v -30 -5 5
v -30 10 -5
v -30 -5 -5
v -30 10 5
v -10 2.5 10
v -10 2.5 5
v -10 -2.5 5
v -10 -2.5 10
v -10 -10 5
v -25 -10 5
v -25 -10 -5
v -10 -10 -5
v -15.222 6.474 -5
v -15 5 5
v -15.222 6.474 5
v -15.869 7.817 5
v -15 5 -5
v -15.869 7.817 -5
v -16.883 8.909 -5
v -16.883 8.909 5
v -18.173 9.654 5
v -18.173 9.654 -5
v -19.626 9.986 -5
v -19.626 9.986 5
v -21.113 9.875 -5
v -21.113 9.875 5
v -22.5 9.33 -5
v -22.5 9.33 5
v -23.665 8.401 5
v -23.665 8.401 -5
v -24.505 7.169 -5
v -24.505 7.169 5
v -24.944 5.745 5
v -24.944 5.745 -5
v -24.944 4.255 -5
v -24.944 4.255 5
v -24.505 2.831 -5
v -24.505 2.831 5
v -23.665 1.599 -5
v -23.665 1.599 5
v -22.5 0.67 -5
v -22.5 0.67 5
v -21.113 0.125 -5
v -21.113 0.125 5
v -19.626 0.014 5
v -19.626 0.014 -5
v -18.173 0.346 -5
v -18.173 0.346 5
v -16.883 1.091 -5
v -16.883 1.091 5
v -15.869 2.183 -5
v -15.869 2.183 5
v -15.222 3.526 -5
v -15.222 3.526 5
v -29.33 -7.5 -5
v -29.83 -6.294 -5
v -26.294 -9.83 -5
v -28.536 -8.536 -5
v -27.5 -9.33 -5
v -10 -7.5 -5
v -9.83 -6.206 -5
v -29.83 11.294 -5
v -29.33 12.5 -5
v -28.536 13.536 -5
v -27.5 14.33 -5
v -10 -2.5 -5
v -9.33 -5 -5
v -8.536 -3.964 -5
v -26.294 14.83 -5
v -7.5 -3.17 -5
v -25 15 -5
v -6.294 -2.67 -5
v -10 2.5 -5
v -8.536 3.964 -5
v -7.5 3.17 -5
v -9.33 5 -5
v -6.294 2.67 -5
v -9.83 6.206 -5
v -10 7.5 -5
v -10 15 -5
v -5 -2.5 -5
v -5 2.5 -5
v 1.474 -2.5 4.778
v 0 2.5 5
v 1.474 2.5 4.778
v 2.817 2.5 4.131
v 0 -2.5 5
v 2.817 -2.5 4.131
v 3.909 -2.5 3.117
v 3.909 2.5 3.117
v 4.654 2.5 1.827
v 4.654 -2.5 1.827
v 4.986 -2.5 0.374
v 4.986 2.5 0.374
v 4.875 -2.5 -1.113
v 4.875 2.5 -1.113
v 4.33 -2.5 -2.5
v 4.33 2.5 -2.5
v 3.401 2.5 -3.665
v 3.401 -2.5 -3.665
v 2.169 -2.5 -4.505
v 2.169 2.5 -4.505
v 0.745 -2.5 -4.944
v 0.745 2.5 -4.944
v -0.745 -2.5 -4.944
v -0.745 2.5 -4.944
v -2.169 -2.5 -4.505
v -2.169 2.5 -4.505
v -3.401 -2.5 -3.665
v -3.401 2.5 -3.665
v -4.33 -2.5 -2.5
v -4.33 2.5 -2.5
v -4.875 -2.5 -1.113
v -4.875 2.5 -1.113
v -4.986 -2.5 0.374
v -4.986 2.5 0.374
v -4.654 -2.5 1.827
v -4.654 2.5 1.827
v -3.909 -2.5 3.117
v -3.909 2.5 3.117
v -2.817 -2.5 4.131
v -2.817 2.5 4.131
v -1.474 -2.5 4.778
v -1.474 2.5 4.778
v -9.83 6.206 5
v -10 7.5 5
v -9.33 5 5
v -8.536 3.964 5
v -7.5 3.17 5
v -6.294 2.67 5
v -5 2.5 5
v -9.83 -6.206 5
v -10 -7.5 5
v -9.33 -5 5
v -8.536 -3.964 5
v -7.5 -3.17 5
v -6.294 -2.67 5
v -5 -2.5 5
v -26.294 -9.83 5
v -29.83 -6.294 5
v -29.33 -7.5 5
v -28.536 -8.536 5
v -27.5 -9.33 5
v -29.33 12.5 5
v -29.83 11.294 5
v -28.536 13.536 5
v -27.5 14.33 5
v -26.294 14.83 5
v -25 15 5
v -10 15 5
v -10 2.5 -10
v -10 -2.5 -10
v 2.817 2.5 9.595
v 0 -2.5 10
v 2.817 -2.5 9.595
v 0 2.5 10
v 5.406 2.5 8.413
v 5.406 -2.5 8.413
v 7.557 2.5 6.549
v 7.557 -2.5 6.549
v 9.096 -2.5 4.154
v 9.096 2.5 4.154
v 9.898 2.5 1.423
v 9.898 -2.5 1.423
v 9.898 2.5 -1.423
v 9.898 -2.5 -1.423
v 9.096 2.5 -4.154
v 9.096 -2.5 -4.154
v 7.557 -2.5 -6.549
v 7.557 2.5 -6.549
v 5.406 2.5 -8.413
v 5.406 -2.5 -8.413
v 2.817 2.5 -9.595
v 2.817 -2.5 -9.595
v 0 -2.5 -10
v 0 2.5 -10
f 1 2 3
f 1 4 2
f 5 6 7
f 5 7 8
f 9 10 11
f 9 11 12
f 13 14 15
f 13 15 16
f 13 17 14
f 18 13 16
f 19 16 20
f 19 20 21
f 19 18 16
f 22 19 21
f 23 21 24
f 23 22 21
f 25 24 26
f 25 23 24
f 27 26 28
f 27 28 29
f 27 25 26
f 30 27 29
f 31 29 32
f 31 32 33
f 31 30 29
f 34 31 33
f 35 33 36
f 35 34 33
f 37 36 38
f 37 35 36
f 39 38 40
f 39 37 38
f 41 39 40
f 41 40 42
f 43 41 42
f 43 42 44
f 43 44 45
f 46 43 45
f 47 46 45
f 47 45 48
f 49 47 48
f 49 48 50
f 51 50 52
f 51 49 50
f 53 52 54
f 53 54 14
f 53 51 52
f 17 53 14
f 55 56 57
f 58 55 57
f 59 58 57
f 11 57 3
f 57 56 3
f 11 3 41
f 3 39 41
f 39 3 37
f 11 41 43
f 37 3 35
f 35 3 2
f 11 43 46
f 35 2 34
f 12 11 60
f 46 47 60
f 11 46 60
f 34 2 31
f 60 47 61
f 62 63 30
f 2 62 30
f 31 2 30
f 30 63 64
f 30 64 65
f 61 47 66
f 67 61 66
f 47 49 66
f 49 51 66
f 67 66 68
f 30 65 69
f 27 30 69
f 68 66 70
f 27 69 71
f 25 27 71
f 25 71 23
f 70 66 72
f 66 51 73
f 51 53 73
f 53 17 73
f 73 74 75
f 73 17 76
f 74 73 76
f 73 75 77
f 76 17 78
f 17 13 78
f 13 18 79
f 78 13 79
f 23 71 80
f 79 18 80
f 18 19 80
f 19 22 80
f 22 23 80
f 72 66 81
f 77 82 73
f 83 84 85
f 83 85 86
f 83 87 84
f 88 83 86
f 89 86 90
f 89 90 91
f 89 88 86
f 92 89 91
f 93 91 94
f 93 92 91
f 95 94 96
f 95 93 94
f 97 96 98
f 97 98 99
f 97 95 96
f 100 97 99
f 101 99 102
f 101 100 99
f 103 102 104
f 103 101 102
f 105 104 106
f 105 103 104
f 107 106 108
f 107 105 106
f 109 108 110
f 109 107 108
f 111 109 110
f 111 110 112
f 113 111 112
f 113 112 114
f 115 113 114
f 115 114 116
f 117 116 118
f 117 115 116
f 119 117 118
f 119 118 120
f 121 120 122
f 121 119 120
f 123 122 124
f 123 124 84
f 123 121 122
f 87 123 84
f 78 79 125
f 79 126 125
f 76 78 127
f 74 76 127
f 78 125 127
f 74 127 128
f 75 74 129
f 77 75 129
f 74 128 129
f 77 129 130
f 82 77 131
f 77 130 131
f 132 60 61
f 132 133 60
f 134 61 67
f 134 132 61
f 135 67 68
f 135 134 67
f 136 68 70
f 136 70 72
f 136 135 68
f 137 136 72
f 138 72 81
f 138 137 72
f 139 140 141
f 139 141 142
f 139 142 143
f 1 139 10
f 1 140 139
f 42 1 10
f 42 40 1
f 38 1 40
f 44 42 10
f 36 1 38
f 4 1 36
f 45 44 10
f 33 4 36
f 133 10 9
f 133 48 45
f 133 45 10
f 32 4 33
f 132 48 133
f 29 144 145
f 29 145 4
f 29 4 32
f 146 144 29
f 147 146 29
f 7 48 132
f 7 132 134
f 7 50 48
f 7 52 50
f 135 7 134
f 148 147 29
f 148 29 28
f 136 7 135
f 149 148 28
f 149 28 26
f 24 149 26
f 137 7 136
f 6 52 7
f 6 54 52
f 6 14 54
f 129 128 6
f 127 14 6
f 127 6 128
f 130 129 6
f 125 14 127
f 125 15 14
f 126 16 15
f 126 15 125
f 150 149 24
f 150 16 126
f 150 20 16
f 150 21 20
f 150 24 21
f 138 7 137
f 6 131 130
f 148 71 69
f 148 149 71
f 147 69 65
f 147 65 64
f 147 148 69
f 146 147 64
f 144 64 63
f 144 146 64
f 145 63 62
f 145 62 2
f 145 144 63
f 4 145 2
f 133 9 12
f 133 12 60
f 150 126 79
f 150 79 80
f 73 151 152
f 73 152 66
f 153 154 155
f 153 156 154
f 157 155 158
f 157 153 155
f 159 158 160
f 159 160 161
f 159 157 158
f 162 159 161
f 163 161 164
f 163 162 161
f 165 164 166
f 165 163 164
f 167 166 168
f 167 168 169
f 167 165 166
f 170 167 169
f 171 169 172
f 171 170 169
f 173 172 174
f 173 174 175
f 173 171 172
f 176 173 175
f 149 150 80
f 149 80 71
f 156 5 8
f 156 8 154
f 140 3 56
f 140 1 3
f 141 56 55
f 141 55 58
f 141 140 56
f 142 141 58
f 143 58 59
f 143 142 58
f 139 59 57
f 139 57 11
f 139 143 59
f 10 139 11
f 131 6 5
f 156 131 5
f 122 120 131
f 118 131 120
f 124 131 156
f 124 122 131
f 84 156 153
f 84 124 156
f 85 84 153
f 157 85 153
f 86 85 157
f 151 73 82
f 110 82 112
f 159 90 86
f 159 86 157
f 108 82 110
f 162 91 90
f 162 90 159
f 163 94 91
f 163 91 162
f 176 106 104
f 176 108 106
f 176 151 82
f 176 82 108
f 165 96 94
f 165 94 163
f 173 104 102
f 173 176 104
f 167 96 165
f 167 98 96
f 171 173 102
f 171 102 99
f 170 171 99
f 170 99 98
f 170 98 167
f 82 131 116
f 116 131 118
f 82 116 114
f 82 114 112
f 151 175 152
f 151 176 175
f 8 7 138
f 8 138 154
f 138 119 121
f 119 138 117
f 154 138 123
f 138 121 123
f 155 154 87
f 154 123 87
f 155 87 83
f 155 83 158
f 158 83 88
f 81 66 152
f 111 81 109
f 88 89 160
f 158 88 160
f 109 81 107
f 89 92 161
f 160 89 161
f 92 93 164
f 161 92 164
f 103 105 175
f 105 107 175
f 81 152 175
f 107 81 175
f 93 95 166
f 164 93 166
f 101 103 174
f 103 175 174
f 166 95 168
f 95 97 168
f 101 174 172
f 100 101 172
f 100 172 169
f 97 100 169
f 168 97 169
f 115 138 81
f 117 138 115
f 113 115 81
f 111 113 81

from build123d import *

# Parameters (mm, degrees)
SKETCH_1_R      = 5
EXTRUDE_1_DEPTH = 2.5
SKETCH_2_R      = 5
EXTRUDE_2_DEPTH = 5
FILLET_1_R      = 5


with BuildPart() as part:
    # 草圖1 → 填料-伸長1 (new, symmetric)
    with BuildSketch(Plane(origin=(0, 0, 0), x_dir=(1, 0, 0), z_dir=(0, 1, 0))):
        with BuildLine():
            Line((0, 10), (-10, 10))
            Line((-10, 10), (-10, -10))
            Line((-10, -10), (0, -10))
            ThreePointArc((0, -10), (10, 0), (0, 10))
        make_face()
        with Locations(Location((0, 0, 0), (0, 0, 270))):
            Circle(SKETCH_1_R, mode=Mode.SUBTRACT)
    extrude(amount=EXTRUDE_1_DEPTH, both=True)

    # 草圖2 → 填料-伸長2 (add, symmetric)
    with BuildSketch(Plane.XY):
        with BuildLine():
            Line((-30, 1.898257061), (-30, -5))
            ThreePointArc((-30, -5), (-28.535533906, -8.535533906), (-25, -10))
            Line((-25, -10), (-10, -10))
            Line((-10, -10), (-10, -2.5))
            Line((-10, -2.5), (-10, 2.5))
            Line((-10, 2.5), (-10, 15))
            Line((-10, 15), (-25, 15))
            ThreePointArc((-25, 15), (-28.535533906, 13.535533906), (-30, 10))
            Line((-30, 10), (-30, 1.898257061))
        make_face()
        with Locations((-20, 5)):
            Circle(SKETCH_2_R, mode=Mode.SUBTRACT)
    extrude(amount=EXTRUDE_2_DEPTH, both=True)

    # 圓角1
    fillet_1_edges = [part.edges().sort_by_distance(p)[0] for p in [
        (-10, -2.5, 0),
        (-10, 2.5, 0),
    ]]
    fillet(fillet_1_edges, radius=FILLET_1_R)


solid = part.part
